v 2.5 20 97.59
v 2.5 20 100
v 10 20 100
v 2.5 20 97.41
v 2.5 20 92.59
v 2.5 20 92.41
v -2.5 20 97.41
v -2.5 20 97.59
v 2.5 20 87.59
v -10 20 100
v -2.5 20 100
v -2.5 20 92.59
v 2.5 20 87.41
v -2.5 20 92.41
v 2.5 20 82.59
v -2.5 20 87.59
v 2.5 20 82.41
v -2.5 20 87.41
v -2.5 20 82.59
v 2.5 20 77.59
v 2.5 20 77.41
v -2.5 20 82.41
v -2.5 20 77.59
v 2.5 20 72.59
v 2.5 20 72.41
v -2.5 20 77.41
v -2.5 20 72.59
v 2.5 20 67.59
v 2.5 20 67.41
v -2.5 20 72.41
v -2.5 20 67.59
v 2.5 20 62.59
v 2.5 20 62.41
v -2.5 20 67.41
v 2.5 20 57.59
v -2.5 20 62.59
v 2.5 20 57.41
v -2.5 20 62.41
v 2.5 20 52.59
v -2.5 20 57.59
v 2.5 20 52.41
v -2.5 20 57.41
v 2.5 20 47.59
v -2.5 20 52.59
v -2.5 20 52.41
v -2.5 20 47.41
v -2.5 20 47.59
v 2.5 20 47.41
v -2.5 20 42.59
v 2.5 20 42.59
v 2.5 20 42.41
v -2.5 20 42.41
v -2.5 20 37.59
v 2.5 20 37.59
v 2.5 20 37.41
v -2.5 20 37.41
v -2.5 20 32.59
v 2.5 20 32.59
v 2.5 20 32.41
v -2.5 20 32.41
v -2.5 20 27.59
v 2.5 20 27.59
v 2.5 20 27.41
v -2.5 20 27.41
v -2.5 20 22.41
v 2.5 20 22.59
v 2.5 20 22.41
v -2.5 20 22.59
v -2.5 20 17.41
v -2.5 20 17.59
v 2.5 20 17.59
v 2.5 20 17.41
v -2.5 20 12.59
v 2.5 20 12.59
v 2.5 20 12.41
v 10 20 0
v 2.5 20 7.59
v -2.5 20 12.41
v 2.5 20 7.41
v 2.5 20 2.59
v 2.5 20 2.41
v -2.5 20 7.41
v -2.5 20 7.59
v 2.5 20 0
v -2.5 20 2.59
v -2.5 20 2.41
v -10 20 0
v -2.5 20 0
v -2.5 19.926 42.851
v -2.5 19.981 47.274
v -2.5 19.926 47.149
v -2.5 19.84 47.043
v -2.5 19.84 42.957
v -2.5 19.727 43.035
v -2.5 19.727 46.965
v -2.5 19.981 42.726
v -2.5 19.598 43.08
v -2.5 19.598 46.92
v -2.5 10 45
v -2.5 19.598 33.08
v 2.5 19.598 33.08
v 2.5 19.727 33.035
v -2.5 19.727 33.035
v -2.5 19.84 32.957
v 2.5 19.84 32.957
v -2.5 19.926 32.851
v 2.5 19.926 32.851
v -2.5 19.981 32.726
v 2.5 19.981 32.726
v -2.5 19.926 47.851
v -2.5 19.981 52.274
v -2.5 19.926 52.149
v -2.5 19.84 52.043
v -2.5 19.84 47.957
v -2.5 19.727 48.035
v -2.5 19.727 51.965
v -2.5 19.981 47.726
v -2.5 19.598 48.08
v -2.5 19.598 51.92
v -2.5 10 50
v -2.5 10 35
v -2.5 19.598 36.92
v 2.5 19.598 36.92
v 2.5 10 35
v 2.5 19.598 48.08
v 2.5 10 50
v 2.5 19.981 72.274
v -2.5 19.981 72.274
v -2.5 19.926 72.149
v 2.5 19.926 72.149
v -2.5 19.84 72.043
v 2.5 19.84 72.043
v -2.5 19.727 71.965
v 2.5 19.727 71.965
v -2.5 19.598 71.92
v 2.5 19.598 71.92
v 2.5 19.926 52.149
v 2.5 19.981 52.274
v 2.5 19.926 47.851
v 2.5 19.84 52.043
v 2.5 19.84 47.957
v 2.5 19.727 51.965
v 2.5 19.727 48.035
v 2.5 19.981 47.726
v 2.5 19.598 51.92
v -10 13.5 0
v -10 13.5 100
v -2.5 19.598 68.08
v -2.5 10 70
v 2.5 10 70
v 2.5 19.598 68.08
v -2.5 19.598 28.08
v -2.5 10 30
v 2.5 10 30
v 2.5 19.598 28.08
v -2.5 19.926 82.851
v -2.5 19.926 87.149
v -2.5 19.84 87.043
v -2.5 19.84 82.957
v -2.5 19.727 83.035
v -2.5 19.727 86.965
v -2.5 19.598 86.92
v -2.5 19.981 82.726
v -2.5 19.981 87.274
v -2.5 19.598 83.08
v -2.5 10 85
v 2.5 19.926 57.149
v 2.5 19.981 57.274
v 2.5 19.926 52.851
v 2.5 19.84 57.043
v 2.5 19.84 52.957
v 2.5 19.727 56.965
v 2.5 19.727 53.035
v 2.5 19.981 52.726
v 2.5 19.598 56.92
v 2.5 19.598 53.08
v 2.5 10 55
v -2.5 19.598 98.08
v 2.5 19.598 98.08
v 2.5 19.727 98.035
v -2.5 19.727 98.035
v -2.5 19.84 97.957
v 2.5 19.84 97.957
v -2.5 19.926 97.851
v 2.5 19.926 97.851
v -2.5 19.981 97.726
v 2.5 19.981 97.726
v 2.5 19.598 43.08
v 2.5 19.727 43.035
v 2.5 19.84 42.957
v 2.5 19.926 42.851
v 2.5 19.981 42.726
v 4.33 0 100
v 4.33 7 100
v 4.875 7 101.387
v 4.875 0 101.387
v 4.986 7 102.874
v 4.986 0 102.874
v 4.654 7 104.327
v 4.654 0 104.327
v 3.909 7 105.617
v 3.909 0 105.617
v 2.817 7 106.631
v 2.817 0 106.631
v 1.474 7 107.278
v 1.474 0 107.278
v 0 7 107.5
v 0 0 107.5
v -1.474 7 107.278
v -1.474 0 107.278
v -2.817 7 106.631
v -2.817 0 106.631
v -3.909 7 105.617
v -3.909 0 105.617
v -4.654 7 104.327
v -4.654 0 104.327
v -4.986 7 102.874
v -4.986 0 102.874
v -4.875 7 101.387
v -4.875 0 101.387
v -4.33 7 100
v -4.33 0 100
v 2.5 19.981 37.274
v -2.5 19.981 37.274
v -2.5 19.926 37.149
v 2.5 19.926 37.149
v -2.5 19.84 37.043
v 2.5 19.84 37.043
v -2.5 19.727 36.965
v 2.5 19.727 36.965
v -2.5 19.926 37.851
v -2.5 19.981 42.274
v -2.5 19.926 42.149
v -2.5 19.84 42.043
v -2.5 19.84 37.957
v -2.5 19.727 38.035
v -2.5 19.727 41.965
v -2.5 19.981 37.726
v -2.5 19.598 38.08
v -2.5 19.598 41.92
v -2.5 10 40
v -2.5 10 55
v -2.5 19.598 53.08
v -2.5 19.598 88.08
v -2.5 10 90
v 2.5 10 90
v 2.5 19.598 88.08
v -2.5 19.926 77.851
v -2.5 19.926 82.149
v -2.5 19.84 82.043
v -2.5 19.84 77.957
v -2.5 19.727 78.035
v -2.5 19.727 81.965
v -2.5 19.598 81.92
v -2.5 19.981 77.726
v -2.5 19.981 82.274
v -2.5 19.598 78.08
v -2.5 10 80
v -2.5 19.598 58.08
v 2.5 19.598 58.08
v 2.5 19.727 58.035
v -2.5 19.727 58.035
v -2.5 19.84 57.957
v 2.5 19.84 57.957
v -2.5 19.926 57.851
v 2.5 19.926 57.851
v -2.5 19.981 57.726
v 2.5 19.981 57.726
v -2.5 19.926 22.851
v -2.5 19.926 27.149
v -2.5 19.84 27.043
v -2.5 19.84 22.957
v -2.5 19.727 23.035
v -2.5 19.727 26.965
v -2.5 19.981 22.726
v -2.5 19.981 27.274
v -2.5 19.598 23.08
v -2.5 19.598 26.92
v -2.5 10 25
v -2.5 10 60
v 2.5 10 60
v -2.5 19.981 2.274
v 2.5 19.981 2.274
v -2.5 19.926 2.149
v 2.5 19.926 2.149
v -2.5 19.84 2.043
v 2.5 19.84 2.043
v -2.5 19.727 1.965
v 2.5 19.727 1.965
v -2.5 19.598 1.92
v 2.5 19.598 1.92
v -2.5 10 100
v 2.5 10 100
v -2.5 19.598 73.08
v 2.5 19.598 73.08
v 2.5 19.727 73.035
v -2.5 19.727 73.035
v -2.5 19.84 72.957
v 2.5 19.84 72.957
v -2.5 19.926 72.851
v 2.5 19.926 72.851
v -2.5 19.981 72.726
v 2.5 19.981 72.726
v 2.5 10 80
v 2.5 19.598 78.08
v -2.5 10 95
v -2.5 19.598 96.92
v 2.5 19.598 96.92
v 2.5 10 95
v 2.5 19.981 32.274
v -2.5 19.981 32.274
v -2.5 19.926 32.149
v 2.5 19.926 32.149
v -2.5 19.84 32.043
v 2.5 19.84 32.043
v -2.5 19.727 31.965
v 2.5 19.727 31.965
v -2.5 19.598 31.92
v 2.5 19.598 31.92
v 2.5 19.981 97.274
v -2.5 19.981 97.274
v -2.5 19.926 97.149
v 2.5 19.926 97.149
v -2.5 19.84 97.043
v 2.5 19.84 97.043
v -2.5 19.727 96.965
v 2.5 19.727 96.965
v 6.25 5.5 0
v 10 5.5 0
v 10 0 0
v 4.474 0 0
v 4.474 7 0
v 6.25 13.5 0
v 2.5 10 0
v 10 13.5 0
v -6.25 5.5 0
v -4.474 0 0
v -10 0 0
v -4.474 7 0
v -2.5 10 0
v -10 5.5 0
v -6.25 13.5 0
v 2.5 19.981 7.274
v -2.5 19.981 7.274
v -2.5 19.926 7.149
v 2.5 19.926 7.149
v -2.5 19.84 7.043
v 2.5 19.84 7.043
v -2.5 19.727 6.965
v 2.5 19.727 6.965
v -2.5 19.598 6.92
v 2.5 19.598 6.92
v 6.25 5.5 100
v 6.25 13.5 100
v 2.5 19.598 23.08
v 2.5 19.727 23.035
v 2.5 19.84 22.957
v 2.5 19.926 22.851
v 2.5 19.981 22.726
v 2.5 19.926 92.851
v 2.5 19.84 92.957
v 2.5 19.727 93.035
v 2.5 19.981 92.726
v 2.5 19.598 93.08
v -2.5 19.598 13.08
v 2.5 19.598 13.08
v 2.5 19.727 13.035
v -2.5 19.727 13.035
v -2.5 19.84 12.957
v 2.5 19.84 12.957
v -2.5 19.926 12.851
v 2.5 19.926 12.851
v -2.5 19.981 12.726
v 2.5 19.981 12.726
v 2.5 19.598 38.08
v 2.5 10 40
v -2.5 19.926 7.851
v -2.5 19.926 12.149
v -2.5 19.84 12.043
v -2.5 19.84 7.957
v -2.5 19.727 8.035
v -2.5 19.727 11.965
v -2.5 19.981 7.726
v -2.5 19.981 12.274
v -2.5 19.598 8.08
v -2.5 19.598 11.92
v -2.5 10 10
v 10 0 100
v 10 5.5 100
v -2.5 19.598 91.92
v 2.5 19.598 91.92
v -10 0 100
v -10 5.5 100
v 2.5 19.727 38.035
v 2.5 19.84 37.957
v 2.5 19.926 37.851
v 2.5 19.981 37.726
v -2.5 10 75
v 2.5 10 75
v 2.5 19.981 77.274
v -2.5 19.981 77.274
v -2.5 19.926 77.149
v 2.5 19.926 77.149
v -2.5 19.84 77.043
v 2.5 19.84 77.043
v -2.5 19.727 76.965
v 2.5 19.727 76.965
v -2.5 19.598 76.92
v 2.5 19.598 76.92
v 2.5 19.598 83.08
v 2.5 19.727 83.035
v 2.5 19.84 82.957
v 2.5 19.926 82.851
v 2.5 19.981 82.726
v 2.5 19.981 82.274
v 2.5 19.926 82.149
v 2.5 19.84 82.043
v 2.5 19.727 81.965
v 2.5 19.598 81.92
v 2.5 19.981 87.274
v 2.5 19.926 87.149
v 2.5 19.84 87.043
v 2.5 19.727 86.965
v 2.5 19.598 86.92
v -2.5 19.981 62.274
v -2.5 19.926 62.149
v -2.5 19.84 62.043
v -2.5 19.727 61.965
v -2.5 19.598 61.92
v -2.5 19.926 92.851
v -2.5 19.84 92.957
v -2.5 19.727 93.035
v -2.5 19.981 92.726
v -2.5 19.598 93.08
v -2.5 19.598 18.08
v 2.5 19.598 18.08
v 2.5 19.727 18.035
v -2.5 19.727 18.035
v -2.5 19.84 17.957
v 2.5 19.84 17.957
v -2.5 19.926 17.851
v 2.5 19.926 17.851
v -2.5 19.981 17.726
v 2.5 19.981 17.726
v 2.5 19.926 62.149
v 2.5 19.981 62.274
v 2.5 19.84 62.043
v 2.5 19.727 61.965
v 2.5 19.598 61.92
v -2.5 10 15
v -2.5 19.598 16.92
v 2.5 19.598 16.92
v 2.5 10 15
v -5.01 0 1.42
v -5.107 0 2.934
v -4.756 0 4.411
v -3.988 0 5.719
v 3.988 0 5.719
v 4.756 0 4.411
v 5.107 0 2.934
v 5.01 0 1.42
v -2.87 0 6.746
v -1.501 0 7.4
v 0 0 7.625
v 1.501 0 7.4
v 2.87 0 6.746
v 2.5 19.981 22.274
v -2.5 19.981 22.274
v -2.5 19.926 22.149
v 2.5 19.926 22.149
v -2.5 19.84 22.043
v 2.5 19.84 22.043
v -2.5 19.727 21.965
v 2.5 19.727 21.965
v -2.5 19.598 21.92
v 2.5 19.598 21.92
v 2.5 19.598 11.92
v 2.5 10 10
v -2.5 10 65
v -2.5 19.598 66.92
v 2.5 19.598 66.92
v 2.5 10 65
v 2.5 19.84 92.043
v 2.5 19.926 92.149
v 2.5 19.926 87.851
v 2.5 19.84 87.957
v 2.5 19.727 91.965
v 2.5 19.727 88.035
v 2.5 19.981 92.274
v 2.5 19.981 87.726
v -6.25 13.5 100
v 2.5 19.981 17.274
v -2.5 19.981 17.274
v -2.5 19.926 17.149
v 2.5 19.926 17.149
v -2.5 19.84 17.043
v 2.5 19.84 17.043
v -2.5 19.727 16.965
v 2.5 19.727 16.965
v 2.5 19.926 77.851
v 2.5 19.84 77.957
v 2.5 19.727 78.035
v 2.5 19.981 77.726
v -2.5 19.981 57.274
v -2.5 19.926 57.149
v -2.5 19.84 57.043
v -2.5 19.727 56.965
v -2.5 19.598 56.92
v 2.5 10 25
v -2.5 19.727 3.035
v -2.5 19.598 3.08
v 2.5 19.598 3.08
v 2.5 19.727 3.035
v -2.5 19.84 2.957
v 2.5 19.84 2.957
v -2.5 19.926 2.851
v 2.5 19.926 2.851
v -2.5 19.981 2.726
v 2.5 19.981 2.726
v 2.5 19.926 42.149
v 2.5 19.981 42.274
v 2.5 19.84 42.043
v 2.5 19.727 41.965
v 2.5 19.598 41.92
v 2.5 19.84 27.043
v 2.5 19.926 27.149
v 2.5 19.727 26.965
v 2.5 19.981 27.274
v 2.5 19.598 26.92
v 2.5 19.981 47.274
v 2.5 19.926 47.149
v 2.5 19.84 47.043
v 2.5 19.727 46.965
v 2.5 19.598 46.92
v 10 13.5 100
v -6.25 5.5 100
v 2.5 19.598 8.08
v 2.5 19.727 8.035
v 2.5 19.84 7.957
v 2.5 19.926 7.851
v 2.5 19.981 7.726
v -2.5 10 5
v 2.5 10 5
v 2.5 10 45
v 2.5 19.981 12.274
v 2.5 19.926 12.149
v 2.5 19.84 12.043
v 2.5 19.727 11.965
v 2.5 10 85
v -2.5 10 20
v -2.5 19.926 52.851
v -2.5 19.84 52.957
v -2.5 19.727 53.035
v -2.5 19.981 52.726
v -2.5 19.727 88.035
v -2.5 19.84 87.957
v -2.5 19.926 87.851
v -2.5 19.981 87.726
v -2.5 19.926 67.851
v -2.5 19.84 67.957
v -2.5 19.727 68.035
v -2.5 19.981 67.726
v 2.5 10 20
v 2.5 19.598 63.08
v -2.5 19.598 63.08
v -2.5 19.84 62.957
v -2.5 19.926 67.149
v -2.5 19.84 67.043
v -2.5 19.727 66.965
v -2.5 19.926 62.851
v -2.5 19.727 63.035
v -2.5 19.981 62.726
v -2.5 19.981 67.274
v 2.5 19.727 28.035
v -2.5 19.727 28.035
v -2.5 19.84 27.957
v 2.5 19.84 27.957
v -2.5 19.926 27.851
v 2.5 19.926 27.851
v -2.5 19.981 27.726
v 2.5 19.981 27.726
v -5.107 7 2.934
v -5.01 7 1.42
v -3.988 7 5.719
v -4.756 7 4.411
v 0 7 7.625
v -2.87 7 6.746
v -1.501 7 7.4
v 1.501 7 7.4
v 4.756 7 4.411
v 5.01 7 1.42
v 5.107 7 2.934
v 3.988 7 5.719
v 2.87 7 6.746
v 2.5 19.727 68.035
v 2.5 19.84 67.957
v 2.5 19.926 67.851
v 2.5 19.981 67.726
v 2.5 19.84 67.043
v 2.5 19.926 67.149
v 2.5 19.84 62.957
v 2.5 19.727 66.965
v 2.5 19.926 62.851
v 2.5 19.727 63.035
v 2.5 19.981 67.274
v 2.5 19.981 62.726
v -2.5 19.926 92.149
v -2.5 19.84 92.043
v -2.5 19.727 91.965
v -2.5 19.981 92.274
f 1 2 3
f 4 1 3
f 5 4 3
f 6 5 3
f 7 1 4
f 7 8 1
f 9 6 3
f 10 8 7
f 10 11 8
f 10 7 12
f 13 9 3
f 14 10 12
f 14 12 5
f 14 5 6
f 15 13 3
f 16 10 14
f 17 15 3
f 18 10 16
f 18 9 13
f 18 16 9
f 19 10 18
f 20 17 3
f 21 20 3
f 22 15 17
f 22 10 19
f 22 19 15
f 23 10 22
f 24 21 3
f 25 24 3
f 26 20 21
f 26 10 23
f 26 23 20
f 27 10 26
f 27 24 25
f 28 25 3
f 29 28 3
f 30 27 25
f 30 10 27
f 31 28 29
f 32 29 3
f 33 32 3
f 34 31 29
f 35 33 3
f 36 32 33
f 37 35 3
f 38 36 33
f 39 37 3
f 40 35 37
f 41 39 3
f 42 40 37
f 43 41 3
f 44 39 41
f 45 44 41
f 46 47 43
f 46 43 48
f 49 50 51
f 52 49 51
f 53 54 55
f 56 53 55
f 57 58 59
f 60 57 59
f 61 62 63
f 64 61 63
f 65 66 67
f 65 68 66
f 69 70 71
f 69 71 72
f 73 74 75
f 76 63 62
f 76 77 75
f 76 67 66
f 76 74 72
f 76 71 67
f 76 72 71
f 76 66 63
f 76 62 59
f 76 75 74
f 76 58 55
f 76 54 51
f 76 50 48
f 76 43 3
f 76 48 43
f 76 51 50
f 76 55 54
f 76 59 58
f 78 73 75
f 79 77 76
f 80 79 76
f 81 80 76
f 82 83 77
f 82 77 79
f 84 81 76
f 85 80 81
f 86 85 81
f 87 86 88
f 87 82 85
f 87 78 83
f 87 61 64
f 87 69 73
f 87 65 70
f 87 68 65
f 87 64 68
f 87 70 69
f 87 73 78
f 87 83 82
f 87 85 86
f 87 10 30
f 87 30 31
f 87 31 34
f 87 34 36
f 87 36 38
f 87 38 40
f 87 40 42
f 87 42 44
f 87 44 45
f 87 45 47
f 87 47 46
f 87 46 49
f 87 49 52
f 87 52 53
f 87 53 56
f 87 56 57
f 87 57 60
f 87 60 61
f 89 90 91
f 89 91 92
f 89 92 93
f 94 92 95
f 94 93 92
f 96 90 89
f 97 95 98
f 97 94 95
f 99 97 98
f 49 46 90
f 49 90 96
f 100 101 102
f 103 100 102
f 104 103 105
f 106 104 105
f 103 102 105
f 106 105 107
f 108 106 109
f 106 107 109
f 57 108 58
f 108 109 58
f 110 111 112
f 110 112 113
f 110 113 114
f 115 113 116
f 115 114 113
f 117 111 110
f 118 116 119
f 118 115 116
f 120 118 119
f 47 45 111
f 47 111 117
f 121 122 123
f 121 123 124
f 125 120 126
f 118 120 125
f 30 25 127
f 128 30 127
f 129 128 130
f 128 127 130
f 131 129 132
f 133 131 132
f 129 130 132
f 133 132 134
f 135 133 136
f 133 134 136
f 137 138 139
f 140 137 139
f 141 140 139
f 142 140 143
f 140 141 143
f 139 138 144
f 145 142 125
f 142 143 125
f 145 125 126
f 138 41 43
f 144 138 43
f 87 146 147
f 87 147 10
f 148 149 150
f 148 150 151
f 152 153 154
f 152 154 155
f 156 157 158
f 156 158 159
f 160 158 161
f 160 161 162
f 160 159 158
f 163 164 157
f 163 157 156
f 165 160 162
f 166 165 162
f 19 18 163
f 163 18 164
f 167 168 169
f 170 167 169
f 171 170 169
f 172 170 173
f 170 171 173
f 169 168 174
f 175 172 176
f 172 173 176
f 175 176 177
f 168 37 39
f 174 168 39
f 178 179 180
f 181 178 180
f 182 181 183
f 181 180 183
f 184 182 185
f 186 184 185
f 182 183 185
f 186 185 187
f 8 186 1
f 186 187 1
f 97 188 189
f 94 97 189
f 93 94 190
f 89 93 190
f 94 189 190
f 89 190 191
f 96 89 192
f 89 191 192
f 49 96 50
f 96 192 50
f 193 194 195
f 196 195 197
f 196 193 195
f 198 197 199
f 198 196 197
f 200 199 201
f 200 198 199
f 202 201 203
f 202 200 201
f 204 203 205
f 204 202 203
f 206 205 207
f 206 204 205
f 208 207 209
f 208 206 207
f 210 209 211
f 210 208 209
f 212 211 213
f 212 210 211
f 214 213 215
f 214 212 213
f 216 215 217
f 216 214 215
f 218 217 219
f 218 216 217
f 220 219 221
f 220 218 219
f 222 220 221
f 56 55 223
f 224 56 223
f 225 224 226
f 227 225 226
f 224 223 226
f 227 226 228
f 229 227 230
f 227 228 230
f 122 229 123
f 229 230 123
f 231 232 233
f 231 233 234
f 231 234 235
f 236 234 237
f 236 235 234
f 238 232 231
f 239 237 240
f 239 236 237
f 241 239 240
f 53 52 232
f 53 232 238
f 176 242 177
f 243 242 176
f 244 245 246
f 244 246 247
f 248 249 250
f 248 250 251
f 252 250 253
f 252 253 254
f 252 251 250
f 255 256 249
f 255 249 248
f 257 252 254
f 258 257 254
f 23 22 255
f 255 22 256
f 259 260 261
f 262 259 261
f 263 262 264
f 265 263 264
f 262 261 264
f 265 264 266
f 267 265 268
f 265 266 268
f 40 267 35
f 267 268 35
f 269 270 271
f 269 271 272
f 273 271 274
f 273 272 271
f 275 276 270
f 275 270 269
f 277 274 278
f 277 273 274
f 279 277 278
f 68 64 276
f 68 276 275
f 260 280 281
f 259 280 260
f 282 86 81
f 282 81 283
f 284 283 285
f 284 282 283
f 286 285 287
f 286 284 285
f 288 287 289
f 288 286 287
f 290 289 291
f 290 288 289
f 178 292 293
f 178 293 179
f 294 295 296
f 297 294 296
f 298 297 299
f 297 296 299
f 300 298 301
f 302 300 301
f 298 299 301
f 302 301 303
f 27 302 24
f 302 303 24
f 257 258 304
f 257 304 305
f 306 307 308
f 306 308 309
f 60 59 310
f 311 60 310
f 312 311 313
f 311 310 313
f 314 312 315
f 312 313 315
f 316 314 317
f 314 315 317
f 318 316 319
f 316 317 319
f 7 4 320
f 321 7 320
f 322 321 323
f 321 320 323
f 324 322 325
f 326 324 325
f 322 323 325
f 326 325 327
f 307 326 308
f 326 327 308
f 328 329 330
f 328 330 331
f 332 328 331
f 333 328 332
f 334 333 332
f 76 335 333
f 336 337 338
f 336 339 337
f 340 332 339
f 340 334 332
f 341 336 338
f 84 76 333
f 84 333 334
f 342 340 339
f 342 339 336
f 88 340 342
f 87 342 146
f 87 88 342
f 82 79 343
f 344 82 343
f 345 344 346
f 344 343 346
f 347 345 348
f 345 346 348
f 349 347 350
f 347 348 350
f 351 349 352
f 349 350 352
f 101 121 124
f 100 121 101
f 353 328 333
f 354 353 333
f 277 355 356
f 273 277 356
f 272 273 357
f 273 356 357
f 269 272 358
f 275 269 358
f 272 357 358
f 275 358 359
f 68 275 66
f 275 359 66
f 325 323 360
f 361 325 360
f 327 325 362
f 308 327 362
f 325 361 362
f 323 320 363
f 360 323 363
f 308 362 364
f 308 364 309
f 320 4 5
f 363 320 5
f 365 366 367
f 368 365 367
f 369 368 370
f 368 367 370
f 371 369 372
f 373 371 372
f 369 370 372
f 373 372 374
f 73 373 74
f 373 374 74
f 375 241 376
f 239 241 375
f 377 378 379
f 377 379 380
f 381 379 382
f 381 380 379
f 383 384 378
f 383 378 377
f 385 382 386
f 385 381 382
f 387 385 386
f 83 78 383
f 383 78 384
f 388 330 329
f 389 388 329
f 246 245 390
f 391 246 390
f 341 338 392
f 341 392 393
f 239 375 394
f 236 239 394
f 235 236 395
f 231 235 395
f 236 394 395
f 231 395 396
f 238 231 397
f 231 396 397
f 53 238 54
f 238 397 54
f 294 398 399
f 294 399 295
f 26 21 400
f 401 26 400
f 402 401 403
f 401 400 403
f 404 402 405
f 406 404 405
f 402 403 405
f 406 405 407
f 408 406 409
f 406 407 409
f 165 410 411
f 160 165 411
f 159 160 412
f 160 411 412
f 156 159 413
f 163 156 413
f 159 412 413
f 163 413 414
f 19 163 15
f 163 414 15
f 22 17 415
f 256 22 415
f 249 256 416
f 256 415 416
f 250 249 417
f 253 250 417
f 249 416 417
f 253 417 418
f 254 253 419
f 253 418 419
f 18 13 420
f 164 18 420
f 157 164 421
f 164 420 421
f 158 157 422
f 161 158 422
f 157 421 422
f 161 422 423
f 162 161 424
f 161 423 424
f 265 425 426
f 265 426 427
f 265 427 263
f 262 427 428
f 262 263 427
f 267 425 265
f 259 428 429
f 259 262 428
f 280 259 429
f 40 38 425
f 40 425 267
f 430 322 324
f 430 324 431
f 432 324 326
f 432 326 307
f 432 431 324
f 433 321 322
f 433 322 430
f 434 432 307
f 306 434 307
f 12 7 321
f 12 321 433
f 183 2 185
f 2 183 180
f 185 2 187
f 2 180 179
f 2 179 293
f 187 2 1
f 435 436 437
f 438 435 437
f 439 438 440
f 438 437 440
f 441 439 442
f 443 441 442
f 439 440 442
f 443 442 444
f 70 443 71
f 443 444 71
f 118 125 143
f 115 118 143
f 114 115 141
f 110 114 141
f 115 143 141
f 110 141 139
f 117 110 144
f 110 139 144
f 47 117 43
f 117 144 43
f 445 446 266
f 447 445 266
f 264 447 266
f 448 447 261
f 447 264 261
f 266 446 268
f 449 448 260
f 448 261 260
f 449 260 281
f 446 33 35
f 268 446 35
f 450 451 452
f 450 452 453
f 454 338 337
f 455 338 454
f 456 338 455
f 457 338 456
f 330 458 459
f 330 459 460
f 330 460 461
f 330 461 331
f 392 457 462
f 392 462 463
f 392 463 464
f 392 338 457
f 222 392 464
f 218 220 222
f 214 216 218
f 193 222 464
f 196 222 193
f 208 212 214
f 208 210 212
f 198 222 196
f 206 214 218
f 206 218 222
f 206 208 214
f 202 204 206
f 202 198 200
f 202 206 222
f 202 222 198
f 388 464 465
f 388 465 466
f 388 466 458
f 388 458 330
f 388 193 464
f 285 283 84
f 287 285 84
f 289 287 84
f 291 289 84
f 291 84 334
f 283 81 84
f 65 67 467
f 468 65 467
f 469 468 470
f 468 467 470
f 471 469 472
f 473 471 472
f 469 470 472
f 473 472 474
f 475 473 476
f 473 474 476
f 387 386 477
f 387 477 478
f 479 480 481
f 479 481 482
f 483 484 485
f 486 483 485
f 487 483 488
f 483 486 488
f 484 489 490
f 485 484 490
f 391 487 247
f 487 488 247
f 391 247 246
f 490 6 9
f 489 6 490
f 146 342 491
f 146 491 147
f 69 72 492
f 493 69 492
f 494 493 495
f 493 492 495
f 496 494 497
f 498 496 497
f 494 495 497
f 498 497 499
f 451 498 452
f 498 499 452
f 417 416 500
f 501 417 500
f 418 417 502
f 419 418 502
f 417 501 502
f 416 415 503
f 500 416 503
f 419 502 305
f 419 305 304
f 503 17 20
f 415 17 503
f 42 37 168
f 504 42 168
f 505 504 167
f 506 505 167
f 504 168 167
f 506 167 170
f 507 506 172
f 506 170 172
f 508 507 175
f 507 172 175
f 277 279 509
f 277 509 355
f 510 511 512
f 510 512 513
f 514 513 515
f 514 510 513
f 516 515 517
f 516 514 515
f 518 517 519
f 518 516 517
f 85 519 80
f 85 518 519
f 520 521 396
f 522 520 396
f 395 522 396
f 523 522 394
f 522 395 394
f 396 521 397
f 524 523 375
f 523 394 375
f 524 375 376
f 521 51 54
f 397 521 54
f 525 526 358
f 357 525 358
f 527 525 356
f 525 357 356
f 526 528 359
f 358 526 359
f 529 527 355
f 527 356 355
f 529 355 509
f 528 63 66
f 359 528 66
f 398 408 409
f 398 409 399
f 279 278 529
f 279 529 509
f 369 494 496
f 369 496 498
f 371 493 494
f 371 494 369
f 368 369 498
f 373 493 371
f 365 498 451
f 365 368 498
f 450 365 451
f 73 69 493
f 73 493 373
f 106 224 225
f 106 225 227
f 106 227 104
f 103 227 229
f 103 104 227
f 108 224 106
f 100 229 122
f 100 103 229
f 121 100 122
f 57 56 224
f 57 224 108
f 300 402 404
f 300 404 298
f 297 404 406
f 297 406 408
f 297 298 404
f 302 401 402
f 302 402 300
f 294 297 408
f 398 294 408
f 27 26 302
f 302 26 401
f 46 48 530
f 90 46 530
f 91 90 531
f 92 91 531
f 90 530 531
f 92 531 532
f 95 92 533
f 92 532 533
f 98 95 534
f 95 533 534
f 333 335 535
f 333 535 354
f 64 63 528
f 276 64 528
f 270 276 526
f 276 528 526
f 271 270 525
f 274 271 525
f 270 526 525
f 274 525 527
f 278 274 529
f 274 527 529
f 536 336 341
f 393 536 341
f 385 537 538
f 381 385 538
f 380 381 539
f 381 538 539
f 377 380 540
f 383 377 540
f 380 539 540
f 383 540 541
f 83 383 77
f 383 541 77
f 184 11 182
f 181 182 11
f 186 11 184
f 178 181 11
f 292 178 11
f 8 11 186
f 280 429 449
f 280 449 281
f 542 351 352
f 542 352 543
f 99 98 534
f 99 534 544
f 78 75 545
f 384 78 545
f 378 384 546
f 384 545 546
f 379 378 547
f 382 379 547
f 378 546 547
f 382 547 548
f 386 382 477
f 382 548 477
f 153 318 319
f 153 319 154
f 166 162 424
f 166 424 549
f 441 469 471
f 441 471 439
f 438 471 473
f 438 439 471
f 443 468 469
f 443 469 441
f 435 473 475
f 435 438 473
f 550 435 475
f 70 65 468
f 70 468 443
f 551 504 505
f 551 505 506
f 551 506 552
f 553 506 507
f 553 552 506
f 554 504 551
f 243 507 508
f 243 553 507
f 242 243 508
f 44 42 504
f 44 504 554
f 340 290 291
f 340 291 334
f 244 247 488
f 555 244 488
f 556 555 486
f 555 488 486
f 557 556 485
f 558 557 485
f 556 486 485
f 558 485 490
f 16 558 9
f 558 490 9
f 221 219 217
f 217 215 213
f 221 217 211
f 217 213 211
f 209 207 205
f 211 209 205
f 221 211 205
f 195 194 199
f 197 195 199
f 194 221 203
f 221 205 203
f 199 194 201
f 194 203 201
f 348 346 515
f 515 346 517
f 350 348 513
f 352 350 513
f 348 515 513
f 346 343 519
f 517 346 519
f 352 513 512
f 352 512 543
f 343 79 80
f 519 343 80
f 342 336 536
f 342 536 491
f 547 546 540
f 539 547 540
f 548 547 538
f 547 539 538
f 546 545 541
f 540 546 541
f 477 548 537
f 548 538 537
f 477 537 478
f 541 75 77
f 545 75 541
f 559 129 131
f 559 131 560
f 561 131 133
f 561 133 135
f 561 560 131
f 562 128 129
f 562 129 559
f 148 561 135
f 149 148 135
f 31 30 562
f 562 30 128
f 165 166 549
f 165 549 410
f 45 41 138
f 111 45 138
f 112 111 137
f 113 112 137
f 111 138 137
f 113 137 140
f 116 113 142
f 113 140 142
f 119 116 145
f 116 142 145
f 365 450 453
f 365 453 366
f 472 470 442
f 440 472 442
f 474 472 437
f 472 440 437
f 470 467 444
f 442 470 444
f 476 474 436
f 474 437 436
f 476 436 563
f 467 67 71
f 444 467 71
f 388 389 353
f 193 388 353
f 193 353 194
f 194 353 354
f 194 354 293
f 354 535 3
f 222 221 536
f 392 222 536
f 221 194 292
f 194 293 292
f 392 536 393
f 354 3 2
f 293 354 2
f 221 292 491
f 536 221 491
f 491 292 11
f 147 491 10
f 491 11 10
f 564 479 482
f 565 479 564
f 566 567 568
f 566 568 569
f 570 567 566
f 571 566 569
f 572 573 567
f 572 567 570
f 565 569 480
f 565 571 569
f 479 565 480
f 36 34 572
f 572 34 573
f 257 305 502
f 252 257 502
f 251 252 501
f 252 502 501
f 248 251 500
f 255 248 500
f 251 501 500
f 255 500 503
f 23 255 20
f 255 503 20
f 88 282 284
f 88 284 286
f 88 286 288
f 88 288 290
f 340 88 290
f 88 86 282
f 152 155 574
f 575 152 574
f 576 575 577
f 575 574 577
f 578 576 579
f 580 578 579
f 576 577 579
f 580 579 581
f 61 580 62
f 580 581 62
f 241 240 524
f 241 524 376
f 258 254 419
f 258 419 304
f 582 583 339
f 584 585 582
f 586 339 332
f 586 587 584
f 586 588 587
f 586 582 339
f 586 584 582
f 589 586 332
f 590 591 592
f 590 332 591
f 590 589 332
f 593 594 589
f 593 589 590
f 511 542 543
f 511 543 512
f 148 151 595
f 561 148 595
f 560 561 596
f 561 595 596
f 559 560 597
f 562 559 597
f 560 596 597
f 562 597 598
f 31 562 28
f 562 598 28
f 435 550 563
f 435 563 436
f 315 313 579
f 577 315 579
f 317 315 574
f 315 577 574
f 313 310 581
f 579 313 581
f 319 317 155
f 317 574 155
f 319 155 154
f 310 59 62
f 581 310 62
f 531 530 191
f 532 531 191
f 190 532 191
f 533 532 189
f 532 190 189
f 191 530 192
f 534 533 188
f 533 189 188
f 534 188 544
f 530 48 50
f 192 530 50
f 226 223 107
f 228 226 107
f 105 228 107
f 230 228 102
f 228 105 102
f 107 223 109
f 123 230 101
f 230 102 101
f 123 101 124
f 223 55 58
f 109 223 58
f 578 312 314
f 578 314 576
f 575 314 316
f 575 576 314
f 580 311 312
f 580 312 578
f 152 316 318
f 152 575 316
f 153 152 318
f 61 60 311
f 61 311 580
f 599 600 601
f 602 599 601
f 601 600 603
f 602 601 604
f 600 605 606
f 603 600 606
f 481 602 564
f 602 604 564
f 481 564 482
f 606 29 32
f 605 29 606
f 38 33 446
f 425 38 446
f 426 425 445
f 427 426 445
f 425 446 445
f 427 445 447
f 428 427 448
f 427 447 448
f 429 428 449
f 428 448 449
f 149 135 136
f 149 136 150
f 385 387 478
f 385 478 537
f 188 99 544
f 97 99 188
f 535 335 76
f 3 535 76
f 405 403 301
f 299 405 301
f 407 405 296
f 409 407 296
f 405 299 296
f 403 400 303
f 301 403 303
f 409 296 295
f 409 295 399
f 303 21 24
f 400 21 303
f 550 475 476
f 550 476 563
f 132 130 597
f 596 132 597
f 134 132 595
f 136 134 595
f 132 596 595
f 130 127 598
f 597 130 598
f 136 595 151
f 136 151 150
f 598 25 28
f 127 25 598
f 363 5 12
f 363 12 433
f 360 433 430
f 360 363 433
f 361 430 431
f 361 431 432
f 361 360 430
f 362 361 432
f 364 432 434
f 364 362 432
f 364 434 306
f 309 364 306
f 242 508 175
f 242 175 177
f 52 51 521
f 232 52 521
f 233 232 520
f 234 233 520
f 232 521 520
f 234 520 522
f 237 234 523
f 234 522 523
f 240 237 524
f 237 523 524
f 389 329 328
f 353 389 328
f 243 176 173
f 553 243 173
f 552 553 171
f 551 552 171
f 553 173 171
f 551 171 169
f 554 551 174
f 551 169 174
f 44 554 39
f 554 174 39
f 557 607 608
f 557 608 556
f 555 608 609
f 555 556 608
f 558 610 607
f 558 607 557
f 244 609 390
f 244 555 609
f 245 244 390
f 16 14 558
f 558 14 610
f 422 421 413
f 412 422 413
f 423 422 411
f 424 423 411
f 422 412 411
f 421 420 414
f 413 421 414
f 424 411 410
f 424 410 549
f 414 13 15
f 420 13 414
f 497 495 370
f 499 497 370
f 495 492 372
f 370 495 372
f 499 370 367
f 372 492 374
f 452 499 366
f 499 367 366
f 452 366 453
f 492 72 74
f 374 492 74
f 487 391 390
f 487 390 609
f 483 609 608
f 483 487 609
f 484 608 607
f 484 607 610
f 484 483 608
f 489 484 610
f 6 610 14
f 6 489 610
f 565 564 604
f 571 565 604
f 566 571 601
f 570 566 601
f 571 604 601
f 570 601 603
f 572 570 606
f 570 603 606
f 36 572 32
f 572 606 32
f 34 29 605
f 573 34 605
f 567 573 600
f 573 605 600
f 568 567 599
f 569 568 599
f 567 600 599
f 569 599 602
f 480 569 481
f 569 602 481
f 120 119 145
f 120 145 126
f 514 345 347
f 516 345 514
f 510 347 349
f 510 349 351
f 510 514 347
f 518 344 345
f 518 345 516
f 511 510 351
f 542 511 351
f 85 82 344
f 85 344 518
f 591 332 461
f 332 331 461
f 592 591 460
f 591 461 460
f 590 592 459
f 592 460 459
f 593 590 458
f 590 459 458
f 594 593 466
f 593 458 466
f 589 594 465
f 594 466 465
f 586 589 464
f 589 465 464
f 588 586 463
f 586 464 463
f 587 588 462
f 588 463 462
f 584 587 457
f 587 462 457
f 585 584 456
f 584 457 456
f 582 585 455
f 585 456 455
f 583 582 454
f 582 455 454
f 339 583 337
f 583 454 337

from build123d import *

# Parameters (mm, degrees)
BOSS_EXTRUDE1_DEPTH = 100
BOSS_EXTRUDE2_DEPTH = 2.5
SKETCH4_R           = 5
BOSS_EXTRUDE3_DEPTH = 7
SKETCH4_3_R         = 5.125
CUT_EXTRUDE1_DEPTH  = 7
SKETCH7_W           = 3.75
SKETCH7_H           = 8
CUT_EXTRUDE4_DEPTH  = 145


with BuildPart() as part:
    # Sketch2 → Boss-Extrude1 (new body)
    with BuildSketch(Plane.XY):
        Polygon((0, 0), (10, 0), (10, 20), (2.5, 20), (2.5, 10), (0, 10), align=None)
    boss_extrude1 = extrude(amount=BOSS_EXTRUDE1_DEPTH)

    # Sketch3 → Boss-Extrude2 (add)
    with BuildSketch(Plane.ZY.offset(-2.5)):
        with BuildLine():
            Line((1.919611614, 19.598058068), (0, 10))
            Line((0, 10), (5, 10))
            Line((5, 10), (3.080388386, 19.598058068))
            ThreePointArc((3.080388386, 19.598058068), (2.907092501, 19.886671071), (2.590098049, 20))
            Line((2.590098049, 20), (2.409901951, 20))
            ThreePointArc((2.409901951, 20), (2.092907499, 19.886671071), (1.919611614, 19.598058068))
        make_face()
        with BuildLine():
            Line((6.919611614, 19.598058068), (5, 10))
            Line((5, 10), (10, 10))
            Line((10, 10), (8.080388386, 19.598058068))
            ThreePointArc((8.080388386, 19.598058068), (7.907092501, 19.886671071), (7.590098049, 20))
            Line((7.590098049, 20), (7.409901951, 20))
            ThreePointArc((7.409901951, 20), (7.092907499, 19.886671071), (6.919611614, 19.598058068))
        make_face()
        with BuildLine():
            Line((11.919611614, 19.598058068), (10, 10))
            Line((10, 10), (15, 10))
            Line((15, 10), (13.080388386, 19.598058068))
            ThreePointArc((13.080388386, 19.598058068), (12.907092501, 19.886671071), (12.590098049, 20))
            Line((12.590098049, 20), (12.409901951, 20))
            ThreePointArc((12.409901951, 20), (12.092907499, 19.886671071), (11.919611614, 19.598058068))
        make_face()
        with BuildLine():
            Line((16.919611614, 19.598058068), (15, 10))
            Line((15, 10), (20, 10))
            Line((20, 10), (18.080388386, 19.598058068))
            ThreePointArc((18.080388386, 19.598058068), (17.907092501, 19.886671071), (17.590098049, 20))
            Line((17.590098049, 20), (17.409901951, 20))
            ThreePointArc((17.409901951, 20), (17.092907499, 19.886671071), (16.919611614, 19.598058068))
        make_face()
        with BuildLine():
            Line((21.919611614, 19.598058068), (20, 10))
            Line((20, 10), (25, 10))
            Line((25, 10), (23.080388386, 19.598058068))
            ThreePointArc((23.080388386, 19.598058068), (22.907092501, 19.886671071), (22.590098049, 20))
            Line((22.590098049, 20), (22.409901951, 20))
            ThreePointArc((22.409901951, 20), (22.092907499, 19.886671071), (21.919611614, 19.598058068))
        make_face()
        with BuildLine():
            Line((26.919611614, 19.598058068), (25, 10))
            Line((25, 10), (30, 10))
            Line((30, 10), (28.080388386, 19.598058068))
            ThreePointArc((28.080388386, 19.598058068), (27.907092501, 19.886671071), (27.590098049, 20))
            Line((27.590098049, 20), (27.409901951, 20))
            ThreePointArc((27.409901951, 20), (27.092907499, 19.886671071), (26.919611614, 19.598058068))
        make_face()
        with BuildLine():
            Line((31.919611614, 19.598058068), (30, 10))
            Line((30, 10), (35, 10))
            Line((35, 10), (33.080388386, 19.598058068))
            ThreePointArc((33.080388386, 19.598058068), (32.907092501, 19.886671071), (32.590098049, 20))
            Line((32.590098049, 20), (32.409901951, 20))
            ThreePointArc((32.409901951, 20), (32.092907499, 19.886671071), (31.919611614, 19.598058068))
        make_face()
        with BuildLine():
            Line((36.919611614, 19.598058068), (35, 10))
            Line((35, 10), (40, 10))
            Line((40, 10), (38.080388386, 19.598058068))
            ThreePointArc((38.080388386, 19.598058068), (37.907092501, 19.886671071), (37.590098049, 20))
            Line((37.590098049, 20), (37.409901951, 20))
            ThreePointArc((37.409901951, 20), (37.092907499, 19.886671071), (36.919611614, 19.598058068))
        make_face()
        with BuildLine():
            Line((41.919611614, 19.598058068), (40, 10))
            Line((40, 10), (45, 10))
            Line((45, 10), (43.080388386, 19.598058068))
            ThreePointArc((43.080388386, 19.598058068), (42.907092501, 19.886671071), (42.590098049, 20))
            Line((42.590098049, 20), (42.409901951, 20))
            ThreePointArc((42.409901951, 20), (42.092907499, 19.886671071), (41.919611614, 19.598058068))
        make_face()
        with BuildLine():
            Line((46.919611614, 19.598058068), (45, 10))
            Line((45, 10), (50, 10))
            Line((50, 10), (48.080388386, 19.598058068))
            ThreePointArc((48.080388386, 19.598058068), (47.907092501, 19.886671071), (47.590098049, 20))
            Line((47.590098049, 20), (47.409901951, 20))
            ThreePointArc((47.409901951, 20), (47.092907499, 19.886671071), (46.919611614, 19.598058068))
        make_face()
        with BuildLine():
            Line((51.919611614, 19.598058068), (50, 10))
            Line((50, 10), (55, 10))
            Line((55, 10), (53.080388386, 19.598058068))
            ThreePointArc((53.080388386, 19.598058068), (52.907092501, 19.886671071), (52.590098049, 20))
            Line((52.590098049, 20), (52.409901951, 20))
            ThreePointArc((52.409901951, 20), (52.092907499, 19.886671071), (51.919611614, 19.598058068))
        make_face()
        with BuildLine():
            Line((56.919611614, 19.598058068), (55, 10))
            Line((55, 10), (60, 10))
            Line((60, 10), (58.080388386, 19.598058068))
            ThreePointArc((58.080388386, 19.598058068), (57.907092501, 19.886671071), (57.590098049, 20))
            Line((57.590098049, 20), (57.409901951, 20))
            ThreePointArc((57.409901951, 20), (57.092907499, 19.886671071), (56.919611614, 19.598058068))
        make_face()
        with BuildLine():
            Line((61.919611614, 19.598058068), (60, 10))
            Line((60, 10), (65, 10))
            Line((65, 10), (63.080388386, 19.598058068))
            ThreePointArc((63.080388386, 19.598058068), (62.907092501, 19.886671071), (62.590098049, 20))
            Line((62.590098049, 20), (62.409901951, 20))
            ThreePointArc((62.409901951, 20), (62.092907499, 19.886671071), (61.919611614, 19.598058068))
        make_face()
        with BuildLine():
            Line((66.919611614, 19.598058068), (65, 10))
            Line((65, 10), (70, 10))
            Line((70, 10), (68.080388386, 19.598058068))
            ThreePointArc((68.080388386, 19.598058068), (67.907092501, 19.886671071), (67.590098049, 20))
            Line((67.590098049, 20), (67.409901951, 20))
            ThreePointArc((67.409901951, 20), (67.092907499, 19.886671071), (66.919611614, 19.598058068))
        make_face()
        with BuildLine():
            Line((71.919611614, 19.598058068), (70, 10))
            Line((70, 10), (75, 10))
            Line((75, 10), (73.080388386, 19.598058068))
            ThreePointArc((73.080388386, 19.598058068), (72.907092501, 19.886671071), (72.590098049, 20))
            Line((72.590098049, 20), (72.409901951, 20))
            ThreePointArc((72.409901951, 20), (72.092907499, 19.886671071), (71.919611614, 19.598058068))
        make_face()
        with BuildLine():
            Line((76.919611614, 19.598058068), (75, 10))
            Line((75, 10), (80, 10))
            Line((80, 10), (78.080388386, 19.598058068))
            ThreePointArc((78.080388386, 19.598058068), (77.907092501, 19.886671071), (77.590098049, 20))
            Line((77.590098049, 20), (77.409901951, 20))
            ThreePointArc((77.409901951, 20), (77.092907499, 19.886671071), (76.919611614, 19.598058068))
        make_face()
        with BuildLine():
            Line((81.919611614, 19.598058068), (80, 10))
            Line((80, 10), (85, 10))
            Line((85, 10), (83.080388386, 19.598058068))
            ThreePointArc((83.080388386, 19.598058068), (82.907092501, 19.886671071), (82.590098049, 20))
            Line((82.590098049, 20), (82.409901951, 20))
            ThreePointArc((82.409901951, 20), (82.092907499, 19.886671071), (81.919611614, 19.598058068))
        make_face()
        with BuildLine():
            Line((86.919611614, 19.598058068), (85, 10))
            Line((85, 10), (90, 10))
            Line((90, 10), (88.080388386, 19.598058068))
            ThreePointArc((88.080388386, 19.598058068), (87.907092501, 19.886671071), (87.590098049, 20))
            Line((87.590098049, 20), (87.409901951, 20))
            ThreePointArc((87.409901951, 20), (87.092907499, 19.886671071), (86.919611614, 19.598058068))
        make_face()
        with BuildLine():
            Line((96.919611614, 19.598058068), (95, 10))
            Line((95, 10), (100, 10))
            Line((100, 10), (98.080388386, 19.598058068))
            ThreePointArc((98.080388386, 19.598058068), (97.907092501, 19.886671071), (97.590098049, 20))
            Line((97.590098049, 20), (97.409901951, 20))
            ThreePointArc((97.409901951, 20), (97.092907499, 19.886671071), (96.919611614, 19.598058068))
        make_face()
        with BuildLine():
            Line((90, 10), (91.919611614, 19.598058068))
            ThreePointArc((91.919611614, 19.598058068), (92.092907499, 19.886671071), (92.409901951, 20))
            Line((92.409901951, 20), (92.590098049, 20))
            ThreePointArc((92.590098049, 20), (92.907092501, 19.886671071), (93.080388386, 19.598058068))
            Line((93.080388386, 19.598058068), (95, 10))
            Line((95, 10), (90, 10))
        make_face()
    boss_extrude2 = extrude(amount=BOSS_EXTRUDE2_DEPTH)

    # Mirror1: Boss-Extrude1, Boss-Extrude2 across plane
    add(boss_extrude1.mirror(Plane(origin=(0, 10, 100), x_dir=(0, 0, 1), z_dir=(1, 0, 0))))
    add(boss_extrude2.mirror(Plane(origin=(0, 10, 100), x_dir=(0, 0, 1), z_dir=(1, 0, 0))))

    # Sketch4 → Boss-Extrude3 (add)
    with BuildSketch(Plane.XZ):
        with Locations((0, 102.5)):
            Circle(SKETCH4_R)
    extrude(amount=-BOSS_EXTRUDE3_DEPTH)

    # Sketch4<3> → Cut-Extrude1 (cut)
    with BuildSketch(Plane.XZ):
        with Locations((0, 2.5)):
            Circle(SKETCH4_3_R)
    extrude(amount=-CUT_EXTRUDE1_DEPTH, mode=Mode.SUBTRACT)

    # Sketch7 → Cut-Extrude4 (cut)
    with BuildSketch(Plane(origin=(0, 0, 0), x_dir=(-1, 0, 0), z_dir=(0, 0, -1))):
        with Locations((-8.125, 9.5)):
            Rectangle(SKETCH7_W, SKETCH7_H)
        with Locations((8.125, 9.5)):
            Rectangle(SKETCH7_W, SKETCH7_H)
    extrude(amount=-CUT_EXTRUDE4_DEPTH, mode=Mode.SUBTRACT)


solid = part.part
